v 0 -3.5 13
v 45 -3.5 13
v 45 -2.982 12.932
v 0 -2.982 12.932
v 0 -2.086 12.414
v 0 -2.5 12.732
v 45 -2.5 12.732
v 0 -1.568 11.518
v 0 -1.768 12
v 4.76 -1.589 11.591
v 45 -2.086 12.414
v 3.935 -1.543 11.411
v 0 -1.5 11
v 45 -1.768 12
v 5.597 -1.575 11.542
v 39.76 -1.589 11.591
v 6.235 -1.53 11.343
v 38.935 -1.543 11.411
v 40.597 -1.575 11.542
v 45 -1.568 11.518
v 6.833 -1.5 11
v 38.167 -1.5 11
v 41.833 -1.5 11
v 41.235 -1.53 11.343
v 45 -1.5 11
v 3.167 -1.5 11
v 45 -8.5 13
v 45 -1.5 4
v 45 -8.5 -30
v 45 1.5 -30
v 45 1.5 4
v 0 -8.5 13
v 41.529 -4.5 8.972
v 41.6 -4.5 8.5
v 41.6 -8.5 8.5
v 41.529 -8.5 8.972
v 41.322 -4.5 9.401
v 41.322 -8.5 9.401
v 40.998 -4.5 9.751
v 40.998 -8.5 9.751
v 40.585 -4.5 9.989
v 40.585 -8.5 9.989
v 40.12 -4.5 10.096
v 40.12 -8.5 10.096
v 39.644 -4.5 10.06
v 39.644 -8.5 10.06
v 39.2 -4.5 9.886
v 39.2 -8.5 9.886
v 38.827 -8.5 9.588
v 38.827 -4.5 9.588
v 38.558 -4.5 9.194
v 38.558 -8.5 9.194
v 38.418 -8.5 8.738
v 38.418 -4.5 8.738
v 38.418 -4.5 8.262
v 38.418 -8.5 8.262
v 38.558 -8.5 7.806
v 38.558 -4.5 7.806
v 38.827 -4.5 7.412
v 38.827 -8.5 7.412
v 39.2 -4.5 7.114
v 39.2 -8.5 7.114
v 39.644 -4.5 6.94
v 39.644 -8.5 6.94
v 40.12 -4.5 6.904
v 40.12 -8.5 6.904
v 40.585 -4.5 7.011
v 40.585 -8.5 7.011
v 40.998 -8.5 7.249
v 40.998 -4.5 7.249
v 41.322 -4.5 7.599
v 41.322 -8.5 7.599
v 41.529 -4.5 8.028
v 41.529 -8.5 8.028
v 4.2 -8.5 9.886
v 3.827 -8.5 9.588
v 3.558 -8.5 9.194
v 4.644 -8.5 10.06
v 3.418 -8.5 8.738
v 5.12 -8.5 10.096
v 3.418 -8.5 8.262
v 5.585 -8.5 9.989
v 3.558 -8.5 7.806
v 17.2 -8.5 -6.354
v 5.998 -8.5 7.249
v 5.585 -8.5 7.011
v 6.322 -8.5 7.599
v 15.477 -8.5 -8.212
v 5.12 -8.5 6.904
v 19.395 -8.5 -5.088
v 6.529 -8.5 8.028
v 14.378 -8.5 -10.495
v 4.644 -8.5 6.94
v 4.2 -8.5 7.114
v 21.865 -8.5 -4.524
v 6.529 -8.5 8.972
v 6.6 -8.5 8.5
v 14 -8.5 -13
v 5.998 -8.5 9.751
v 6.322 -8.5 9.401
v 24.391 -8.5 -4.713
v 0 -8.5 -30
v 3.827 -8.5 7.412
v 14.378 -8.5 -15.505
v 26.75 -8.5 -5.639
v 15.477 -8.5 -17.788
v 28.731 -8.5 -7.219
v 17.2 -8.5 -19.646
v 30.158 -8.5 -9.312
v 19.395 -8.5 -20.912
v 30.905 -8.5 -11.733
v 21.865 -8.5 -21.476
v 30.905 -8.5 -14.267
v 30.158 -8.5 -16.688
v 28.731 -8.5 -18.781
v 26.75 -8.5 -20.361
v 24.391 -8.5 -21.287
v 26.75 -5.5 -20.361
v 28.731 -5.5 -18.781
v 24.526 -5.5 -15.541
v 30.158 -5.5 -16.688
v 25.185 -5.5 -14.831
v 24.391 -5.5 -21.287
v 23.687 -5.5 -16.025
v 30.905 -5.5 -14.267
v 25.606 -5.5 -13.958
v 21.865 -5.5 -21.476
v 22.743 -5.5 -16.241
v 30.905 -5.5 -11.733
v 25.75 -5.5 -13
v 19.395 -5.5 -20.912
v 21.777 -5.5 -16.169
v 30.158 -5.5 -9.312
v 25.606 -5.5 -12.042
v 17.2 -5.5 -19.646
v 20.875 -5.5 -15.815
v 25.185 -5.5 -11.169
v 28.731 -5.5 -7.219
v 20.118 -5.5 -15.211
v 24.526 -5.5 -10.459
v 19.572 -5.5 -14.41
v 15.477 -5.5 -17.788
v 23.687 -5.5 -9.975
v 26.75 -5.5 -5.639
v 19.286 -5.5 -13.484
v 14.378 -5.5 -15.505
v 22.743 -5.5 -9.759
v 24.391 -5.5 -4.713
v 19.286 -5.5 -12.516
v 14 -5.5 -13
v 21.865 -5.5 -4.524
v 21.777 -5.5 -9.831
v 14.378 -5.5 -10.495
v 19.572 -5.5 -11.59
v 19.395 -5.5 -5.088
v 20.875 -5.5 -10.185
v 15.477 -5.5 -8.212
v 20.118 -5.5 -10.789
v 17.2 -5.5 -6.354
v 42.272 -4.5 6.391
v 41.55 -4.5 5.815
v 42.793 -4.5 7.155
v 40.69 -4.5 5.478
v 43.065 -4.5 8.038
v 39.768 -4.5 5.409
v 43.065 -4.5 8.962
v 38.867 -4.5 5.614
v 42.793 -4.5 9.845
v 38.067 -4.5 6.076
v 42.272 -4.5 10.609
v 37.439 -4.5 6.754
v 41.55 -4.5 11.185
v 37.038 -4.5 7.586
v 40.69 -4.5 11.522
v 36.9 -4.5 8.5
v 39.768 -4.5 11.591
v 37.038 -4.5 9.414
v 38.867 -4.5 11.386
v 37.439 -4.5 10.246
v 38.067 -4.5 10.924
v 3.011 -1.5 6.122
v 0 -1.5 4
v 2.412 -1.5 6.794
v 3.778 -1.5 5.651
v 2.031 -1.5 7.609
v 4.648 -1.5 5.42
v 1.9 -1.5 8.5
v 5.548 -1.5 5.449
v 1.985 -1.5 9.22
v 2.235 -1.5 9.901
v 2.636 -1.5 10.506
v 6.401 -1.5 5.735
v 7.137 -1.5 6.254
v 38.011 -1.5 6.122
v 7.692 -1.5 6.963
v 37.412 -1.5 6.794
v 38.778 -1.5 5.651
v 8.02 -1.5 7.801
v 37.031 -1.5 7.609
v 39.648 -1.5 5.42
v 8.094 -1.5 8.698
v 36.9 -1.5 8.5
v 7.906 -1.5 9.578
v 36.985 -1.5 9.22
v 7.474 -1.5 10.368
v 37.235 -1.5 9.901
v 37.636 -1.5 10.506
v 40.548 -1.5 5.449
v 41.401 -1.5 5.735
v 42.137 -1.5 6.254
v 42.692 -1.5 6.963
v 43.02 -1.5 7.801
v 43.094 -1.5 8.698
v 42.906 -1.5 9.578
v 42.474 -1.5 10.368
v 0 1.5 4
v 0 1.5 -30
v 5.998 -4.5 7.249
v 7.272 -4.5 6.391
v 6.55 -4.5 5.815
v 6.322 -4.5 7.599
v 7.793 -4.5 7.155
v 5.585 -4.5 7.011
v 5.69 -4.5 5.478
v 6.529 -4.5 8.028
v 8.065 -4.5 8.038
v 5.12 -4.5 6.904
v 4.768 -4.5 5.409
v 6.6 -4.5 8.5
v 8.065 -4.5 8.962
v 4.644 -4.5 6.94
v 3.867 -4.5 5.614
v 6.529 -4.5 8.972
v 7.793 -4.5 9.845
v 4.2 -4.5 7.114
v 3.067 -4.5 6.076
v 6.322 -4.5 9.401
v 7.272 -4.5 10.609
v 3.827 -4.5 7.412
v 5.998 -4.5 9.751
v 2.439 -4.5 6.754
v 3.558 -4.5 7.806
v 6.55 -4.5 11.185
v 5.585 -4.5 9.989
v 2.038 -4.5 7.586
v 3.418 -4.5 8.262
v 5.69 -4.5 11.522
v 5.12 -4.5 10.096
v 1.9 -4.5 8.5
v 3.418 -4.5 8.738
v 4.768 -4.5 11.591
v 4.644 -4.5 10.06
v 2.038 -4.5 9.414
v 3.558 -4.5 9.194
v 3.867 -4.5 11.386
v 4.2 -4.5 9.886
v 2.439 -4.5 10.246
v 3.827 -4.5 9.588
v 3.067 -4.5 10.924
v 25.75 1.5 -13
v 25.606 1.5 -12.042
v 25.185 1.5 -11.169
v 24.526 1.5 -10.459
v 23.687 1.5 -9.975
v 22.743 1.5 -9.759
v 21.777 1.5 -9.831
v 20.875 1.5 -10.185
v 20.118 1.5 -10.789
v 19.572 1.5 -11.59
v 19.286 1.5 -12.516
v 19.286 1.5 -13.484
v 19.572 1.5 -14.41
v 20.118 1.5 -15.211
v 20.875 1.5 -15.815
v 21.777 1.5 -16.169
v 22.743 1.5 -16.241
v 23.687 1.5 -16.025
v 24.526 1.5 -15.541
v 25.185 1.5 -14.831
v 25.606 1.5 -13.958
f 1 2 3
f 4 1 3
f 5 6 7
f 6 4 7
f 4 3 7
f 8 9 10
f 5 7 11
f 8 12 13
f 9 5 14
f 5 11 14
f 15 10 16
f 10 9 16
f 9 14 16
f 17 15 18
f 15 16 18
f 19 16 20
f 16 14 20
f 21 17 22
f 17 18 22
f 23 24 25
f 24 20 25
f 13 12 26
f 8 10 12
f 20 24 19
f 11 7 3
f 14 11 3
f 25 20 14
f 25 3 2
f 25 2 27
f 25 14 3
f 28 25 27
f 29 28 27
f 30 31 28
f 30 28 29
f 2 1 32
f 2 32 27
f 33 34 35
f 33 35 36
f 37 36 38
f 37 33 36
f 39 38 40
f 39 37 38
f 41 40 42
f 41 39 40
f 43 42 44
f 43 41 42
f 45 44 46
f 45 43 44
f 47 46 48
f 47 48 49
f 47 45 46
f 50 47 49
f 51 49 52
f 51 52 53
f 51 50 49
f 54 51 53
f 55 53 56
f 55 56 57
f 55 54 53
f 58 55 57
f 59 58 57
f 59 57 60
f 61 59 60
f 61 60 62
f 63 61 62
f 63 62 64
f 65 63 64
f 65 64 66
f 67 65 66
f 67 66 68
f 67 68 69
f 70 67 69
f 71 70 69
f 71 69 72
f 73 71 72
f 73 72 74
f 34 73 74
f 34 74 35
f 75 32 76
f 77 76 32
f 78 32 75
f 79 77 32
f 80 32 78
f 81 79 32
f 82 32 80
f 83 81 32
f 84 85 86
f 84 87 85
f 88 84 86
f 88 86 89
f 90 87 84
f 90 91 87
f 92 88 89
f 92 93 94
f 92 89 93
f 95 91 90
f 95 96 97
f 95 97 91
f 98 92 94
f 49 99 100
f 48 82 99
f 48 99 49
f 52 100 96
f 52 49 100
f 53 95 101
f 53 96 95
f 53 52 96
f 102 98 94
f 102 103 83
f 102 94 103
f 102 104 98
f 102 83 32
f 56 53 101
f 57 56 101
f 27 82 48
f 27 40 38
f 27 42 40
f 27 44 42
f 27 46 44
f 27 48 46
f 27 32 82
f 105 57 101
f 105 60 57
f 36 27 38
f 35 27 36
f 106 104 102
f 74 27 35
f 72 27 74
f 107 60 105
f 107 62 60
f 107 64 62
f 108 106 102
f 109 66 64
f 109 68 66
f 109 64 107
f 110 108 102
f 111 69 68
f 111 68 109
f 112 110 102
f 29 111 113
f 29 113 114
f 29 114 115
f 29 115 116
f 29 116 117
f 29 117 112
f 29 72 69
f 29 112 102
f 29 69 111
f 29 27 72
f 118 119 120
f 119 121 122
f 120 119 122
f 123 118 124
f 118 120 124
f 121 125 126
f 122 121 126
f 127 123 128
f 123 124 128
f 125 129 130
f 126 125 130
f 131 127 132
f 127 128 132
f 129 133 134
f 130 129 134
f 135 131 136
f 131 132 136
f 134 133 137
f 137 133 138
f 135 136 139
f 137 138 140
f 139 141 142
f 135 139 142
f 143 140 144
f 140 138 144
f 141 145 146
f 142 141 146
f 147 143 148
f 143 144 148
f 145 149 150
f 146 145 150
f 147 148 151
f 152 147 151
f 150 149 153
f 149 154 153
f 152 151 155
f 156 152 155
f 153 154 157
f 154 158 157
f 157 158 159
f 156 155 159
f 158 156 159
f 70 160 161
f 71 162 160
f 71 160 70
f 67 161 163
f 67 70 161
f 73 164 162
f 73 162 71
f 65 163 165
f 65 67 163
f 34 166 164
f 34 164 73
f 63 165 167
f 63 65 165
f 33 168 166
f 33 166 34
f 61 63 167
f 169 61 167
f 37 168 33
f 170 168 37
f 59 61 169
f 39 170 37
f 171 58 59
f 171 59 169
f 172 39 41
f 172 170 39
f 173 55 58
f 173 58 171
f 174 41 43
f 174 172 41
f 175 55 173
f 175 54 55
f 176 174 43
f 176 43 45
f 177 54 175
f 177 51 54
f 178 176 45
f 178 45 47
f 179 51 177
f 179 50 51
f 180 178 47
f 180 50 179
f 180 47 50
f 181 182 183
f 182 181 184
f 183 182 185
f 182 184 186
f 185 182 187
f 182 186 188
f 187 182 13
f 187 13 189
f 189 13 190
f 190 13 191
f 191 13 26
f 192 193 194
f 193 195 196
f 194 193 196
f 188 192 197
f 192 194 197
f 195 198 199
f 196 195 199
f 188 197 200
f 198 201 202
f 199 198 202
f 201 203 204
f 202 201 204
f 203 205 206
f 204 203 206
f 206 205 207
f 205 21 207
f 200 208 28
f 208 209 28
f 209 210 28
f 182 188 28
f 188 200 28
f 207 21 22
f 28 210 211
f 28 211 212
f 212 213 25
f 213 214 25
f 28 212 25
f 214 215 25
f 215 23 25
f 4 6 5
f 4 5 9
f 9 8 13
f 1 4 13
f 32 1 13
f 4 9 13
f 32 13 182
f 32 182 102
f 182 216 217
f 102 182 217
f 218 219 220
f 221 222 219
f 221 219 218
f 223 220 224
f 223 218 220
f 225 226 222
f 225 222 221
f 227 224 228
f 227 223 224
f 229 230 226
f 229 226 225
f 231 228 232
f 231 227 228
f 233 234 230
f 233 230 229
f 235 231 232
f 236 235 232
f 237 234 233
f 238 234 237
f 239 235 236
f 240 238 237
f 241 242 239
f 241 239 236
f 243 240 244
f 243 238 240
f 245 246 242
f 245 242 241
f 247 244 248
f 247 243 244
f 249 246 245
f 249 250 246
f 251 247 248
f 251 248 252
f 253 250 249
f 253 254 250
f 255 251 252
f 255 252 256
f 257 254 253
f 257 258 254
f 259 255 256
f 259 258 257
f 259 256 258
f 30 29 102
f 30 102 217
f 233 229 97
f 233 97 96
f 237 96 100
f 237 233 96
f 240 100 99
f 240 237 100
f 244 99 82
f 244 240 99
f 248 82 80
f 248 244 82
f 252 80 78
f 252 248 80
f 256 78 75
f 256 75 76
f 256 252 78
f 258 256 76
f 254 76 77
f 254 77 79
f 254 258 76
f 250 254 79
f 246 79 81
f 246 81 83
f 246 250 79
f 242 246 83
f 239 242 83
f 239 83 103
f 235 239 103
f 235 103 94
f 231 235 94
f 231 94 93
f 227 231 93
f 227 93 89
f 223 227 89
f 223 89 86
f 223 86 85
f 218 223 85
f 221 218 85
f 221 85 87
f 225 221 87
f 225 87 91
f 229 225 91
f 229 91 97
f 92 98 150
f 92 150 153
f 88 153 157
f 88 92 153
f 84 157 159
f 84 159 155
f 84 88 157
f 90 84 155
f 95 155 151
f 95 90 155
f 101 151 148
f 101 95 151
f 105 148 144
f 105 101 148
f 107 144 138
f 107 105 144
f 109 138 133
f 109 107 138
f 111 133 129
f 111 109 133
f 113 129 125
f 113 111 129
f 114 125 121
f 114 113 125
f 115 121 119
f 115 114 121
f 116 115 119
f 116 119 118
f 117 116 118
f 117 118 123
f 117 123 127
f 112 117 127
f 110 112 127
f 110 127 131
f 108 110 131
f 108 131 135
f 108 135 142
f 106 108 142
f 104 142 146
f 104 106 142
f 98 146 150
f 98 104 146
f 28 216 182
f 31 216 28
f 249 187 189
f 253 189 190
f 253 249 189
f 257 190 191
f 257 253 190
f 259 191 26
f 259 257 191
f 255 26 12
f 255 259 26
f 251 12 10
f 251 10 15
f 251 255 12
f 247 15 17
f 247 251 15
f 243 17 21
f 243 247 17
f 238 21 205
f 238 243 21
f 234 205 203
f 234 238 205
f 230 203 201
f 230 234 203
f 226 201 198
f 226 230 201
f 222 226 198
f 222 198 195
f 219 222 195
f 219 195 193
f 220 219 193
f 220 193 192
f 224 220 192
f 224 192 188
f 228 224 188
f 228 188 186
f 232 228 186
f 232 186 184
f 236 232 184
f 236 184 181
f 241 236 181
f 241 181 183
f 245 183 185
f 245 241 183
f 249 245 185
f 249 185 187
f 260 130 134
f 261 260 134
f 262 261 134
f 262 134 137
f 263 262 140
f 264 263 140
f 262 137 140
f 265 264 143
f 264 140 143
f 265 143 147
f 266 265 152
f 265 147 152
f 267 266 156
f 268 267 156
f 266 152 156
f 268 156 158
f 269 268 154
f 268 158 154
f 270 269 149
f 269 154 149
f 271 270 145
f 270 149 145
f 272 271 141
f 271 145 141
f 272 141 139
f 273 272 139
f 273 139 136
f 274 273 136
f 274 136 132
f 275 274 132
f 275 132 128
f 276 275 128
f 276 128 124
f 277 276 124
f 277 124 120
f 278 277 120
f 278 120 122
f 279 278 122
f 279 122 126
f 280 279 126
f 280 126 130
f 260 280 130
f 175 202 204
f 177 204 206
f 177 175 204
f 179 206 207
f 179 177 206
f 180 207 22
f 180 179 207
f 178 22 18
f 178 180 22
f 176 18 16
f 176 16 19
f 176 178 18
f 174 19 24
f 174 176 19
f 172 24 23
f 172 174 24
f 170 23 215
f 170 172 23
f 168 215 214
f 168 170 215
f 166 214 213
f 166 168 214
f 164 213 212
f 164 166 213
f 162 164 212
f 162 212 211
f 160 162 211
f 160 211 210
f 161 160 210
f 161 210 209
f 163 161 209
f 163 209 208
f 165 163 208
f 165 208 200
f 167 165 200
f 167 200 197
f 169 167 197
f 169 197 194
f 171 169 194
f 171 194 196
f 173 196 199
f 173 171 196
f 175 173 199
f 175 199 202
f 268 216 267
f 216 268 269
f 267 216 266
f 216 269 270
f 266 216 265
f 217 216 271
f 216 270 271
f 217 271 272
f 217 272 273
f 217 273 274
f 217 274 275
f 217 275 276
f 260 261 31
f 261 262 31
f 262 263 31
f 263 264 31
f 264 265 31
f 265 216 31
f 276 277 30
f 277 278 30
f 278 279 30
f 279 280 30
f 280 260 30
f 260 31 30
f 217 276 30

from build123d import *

# Parameters (mm, degrees)
ESBO_O1_W                  = 90
ESBO_O1_H                  = 3
RESSALTO_EXTRUS_O1_DEPTH   = 4
ESBO_O2_W                  = 45
ESBO_O2_H                  = 13
ESBO_O2_R                  = 1.6
RESSALTO_EXTRUS_O3_DEPTH   = 7
CORTE_EXTRUS_O1_DEPTH      = 10
CORTE_EXTRUS_O1_DEPTH_BACK = 3
ESBO_O3_R                  = 3.1
FILETE3_R                  = 2
ESBO_O4_W                  = 45
ESBO_O4_H                  = 3
CORTE_EXTRUS_O2_DEPTH      = 47.671726032
ESBO_O5_W                  = 30
ESBO_O5_H                  = 10
RESSALTO_EXTRUS_O4_DEPTH   = 45
ESBO_O6_R                  = 3.25
CORTE_EXTRUS_O3_DEPTH      = 56.000000082
ESBO_O7_R                  = 8.5
CORTE_EXTRUS_O5_DEPTH      = 3


with BuildPart() as part:
    # Esboço1 → Ressalto-extrusão1 (new body)
    with BuildSketch(Plane.XY):
        Rectangle(ESBO_O1_W, ESBO_O1_H)
    extrude(amount=RESSALTO_EXTRUS_O1_DEPTH)

    # Esboço2 → Ressalto-extrusão3 (add)
    with BuildSketch(Plane.XZ.offset(1.5)):
        with Locations((22.5, 6.5)):
            Rectangle(ESBO_O2_W, ESBO_O2_H)
        with Locations((40, 8.5)):
            Circle(ESBO_O2_R, mode=Mode.SUBTRACT)
        with Locations((5, 8.5)):
            Circle(ESBO_O2_R, mode=Mode.SUBTRACT)
    extrude(amount=RESSALTO_EXTRUS_O3_DEPTH)

    # Esboço3 → Corte-extrusão1 (cut, two sides: drawn at the far end of the back side and taken through both)
    with BuildSketch(Plane(origin=(0, -1.5, 0), x_dir=(1, 0, 0), z_dir=(0, 1, 0)).offset(-CORTE_EXTRUS_O1_DEPTH_BACK)):
        with Locations(Location((5, -8.5, 0), (0, 0, 180))):
            Circle(ESBO_O3_R)
        with Locations(Location((40, -8.5, 0), (0, 0, 180))):
            Circle(ESBO_O3_R)
    extrude(amount=CORTE_EXTRUS_O1_DEPTH + CORTE_EXTRUS_O1_DEPTH_BACK, mode=Mode.SUBTRACT)

    # Filete3
    # the kernel refuses this fillet: 2 mm, written as the material it takes off along each edge
    with BuildSketch(Plane(origin=(50, -1.5, 13), x_dir=(0, 0, -1), z_dir=(-1, 0, 0))) as filete3_piece_1:
        with BuildLine():
            CenterArc((FILETE3_R, FILETE3_R), FILETE3_R, 180, 90)
            Line((0, FILETE3_R), (0, 0))
            Line((0, 0), (FILETE3_R, 0))
        make_face()
    extrude(amount=55, mode=Mode.SUBTRACT)

    # Esboço4 → Corte-extrusão2 (cut, through all)
    with BuildSketch(Plane.XY.offset(4)):
        with Locations((-22.5, 0)):
            Rectangle(ESBO_O4_W, ESBO_O4_H)
    extrude(amount=-CORTE_EXTRUS_O2_DEPTH, mode=Mode.SUBTRACT)

    # Esboço5 → Ressalto-extrusão4 (add)
    with BuildSketch(Plane(origin=(45, 0, 0), x_dir=(0, 0, -1), z_dir=(1, 0, 0))):
        with Locations((15, -3.5)):
            Rectangle(ESBO_O5_W, ESBO_O5_H)
    extrude(amount=-RESSALTO_EXTRUS_O4_DEPTH)

    # Esboço6 → Corte-extrusão3 (cut, through all)
    with BuildSketch(Plane.XZ.offset(8.5)):
        with Locations((22.5, -13)):
            Circle(ESBO_O6_R)
    extrude(amount=-CORTE_EXTRUS_O3_DEPTH, mode=Mode.SUBTRACT)

    # Esboço7 → Corte-extrusão5 (cut)
    with BuildSketch(Plane(origin=(0, -8.5, 0), x_dir=(1, 0, 0), z_dir=(0, 1, 0))):
        with Locations(Location((22.5, 13, 0), (0, 0, 180))):
            Circle(ESBO_O7_R)
    extrude(amount=CORTE_EXTRUS_O5_DEPTH, mode=Mode.SUBTRACT)


solid = part.part
